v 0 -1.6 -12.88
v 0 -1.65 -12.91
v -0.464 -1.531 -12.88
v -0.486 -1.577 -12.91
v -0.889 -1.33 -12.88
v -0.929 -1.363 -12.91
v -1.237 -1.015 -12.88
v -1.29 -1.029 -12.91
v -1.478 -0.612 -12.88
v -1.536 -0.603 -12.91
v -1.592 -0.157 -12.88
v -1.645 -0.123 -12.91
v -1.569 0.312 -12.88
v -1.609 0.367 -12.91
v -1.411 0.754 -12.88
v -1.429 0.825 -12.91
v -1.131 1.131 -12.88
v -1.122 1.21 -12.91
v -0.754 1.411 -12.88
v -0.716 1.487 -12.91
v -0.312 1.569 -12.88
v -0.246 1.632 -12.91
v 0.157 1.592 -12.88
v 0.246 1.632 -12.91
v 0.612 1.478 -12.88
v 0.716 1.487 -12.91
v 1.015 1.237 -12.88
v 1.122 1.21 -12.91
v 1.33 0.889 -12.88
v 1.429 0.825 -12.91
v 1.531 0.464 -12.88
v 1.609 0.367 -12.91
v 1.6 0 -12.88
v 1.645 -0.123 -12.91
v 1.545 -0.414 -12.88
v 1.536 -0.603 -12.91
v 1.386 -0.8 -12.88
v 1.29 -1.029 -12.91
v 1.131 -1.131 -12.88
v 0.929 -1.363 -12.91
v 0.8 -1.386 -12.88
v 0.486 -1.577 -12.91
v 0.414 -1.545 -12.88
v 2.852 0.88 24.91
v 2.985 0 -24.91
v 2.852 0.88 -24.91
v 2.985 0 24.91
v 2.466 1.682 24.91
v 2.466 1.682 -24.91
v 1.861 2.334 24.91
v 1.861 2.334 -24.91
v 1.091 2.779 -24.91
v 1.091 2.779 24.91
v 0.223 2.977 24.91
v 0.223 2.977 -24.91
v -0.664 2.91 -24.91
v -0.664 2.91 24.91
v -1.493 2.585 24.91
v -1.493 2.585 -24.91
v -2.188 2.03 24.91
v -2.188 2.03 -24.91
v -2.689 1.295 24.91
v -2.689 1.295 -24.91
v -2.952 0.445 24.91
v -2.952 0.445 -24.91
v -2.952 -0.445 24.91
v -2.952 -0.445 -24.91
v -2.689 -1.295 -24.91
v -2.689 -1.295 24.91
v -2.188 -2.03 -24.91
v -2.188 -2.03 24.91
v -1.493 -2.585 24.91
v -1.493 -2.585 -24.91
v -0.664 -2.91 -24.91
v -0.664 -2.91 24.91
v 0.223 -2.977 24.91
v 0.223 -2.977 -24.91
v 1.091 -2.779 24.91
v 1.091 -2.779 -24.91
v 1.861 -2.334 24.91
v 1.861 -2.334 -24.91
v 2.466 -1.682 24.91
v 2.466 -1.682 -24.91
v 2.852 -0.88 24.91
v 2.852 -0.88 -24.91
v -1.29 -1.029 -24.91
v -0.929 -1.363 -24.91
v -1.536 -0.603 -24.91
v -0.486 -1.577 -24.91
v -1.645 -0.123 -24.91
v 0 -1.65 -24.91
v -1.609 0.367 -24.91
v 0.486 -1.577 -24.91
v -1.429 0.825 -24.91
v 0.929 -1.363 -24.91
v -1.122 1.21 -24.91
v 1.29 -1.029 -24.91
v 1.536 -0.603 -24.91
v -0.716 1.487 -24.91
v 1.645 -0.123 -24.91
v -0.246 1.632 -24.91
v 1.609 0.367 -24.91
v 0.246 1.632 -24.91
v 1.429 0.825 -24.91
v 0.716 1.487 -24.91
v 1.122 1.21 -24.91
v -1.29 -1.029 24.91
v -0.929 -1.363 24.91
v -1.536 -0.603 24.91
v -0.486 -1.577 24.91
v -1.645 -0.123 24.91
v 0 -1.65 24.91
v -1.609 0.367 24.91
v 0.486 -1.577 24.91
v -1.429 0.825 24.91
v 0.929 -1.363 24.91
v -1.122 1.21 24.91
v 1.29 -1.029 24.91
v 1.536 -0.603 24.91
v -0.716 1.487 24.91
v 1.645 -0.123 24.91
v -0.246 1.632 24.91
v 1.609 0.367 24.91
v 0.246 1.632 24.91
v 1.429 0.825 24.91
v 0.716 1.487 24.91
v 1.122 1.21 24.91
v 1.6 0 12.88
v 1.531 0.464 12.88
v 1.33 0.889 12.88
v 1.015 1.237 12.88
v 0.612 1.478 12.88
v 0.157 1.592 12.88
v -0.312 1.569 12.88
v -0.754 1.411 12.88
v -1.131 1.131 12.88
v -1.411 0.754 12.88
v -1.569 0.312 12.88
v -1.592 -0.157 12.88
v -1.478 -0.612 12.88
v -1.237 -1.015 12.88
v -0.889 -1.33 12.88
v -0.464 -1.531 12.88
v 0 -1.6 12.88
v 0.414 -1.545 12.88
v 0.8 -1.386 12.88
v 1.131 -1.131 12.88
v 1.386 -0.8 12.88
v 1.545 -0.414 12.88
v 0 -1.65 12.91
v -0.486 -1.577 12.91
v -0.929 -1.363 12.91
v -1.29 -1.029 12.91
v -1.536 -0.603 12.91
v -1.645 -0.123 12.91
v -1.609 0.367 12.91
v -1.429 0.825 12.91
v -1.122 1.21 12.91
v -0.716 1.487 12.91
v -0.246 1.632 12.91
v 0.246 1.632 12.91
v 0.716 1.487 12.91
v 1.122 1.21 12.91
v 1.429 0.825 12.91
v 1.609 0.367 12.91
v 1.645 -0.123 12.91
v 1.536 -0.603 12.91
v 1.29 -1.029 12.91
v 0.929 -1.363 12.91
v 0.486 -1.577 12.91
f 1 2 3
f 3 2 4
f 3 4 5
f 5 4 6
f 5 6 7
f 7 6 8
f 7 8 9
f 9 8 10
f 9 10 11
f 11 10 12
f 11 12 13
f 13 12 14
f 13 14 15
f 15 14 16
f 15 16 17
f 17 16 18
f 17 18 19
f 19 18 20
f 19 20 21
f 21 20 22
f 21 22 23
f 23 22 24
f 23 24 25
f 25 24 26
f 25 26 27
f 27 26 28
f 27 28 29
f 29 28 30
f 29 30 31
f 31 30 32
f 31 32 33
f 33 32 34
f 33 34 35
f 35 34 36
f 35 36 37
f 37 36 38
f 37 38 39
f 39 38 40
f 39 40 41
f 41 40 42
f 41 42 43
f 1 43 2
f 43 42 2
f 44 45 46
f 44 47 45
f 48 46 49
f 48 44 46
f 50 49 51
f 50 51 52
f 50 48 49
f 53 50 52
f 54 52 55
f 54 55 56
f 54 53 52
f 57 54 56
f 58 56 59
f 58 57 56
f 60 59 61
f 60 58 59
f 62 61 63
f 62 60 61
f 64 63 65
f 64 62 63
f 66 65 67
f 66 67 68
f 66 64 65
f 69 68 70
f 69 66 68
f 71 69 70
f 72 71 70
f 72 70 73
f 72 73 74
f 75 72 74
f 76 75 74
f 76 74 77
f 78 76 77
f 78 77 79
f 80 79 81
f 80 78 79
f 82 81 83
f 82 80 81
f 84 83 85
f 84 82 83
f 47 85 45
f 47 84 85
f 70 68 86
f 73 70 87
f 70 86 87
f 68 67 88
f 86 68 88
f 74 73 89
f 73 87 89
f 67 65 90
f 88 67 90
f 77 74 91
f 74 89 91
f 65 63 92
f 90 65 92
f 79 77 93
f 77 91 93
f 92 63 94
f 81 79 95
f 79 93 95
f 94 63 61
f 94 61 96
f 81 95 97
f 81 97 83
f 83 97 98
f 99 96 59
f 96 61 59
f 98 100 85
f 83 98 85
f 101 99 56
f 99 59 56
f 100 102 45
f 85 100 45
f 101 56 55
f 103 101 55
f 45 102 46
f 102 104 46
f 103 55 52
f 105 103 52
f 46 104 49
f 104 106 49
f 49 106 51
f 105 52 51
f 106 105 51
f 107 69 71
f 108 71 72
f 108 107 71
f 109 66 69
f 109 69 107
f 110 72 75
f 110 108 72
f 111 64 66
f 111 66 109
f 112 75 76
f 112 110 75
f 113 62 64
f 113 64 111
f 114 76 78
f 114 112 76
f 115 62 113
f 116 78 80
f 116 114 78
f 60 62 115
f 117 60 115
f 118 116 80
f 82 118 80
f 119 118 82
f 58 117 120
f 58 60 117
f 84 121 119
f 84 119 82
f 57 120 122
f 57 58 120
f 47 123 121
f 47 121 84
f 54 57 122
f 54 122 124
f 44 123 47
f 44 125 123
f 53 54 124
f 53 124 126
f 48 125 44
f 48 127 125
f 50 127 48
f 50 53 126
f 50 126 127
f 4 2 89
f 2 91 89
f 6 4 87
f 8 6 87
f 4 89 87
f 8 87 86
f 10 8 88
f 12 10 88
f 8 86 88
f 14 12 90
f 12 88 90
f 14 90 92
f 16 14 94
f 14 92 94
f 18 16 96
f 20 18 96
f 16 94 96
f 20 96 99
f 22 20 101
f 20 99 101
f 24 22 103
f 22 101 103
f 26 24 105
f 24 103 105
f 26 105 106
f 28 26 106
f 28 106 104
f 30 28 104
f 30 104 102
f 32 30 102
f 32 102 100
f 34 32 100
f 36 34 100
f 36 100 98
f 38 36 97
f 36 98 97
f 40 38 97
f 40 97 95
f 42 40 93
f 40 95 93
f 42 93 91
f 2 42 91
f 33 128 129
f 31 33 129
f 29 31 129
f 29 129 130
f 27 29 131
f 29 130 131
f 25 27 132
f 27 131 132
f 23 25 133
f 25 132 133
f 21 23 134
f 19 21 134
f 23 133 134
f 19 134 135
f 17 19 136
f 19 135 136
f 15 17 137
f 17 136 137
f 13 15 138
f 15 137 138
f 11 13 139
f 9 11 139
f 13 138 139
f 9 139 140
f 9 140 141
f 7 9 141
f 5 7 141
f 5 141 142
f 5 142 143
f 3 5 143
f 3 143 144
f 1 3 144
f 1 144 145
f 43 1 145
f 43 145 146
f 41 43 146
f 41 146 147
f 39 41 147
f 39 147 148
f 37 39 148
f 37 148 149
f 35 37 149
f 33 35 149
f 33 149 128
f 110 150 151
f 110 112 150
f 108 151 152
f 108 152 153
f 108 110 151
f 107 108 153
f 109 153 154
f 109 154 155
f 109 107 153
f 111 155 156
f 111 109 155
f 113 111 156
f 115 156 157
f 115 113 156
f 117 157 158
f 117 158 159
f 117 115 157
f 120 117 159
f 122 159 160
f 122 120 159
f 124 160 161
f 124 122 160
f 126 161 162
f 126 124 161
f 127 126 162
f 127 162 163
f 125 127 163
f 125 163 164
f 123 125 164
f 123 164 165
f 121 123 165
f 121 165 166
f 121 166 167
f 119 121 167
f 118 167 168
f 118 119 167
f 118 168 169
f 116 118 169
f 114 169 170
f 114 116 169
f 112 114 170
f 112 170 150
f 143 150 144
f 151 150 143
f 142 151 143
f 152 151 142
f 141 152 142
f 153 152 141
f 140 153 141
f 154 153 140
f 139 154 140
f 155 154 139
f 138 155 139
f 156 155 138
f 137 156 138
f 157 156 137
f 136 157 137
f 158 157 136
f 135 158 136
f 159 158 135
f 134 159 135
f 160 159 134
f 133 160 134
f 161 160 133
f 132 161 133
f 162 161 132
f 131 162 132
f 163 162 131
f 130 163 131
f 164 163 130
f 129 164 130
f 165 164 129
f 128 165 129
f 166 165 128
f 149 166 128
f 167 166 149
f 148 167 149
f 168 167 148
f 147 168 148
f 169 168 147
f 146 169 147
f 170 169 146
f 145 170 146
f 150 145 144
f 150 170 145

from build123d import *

# Parameters (mm, degrees)
SCHIZZO1_R                   = 2.985
ESTRUSIONE_ESTRUSIONE1_DEPTH = 24.91
SCHIZZO2_R                   = 1.6
TAGLIO_ESTRUSIONE1_DEPTH     = 50.998528478


with BuildPart() as part:
    # Schizzo1 → Estrusione-Estrusione1 (new, symmetric)
    with BuildSketch(Plane.XY):
        Circle(SCHIZZO1_R)
    extrude(amount=ESTRUSIONE_ESTRUSIONE1_DEPTH, both=True)

    # Schizzo2 → Taglio-Estrusione1 (cut, through all)
    with BuildSketch(Plane.XY.offset(24.91)):
        Circle(SCHIZZO2_R)
    extrude(amount=-TAGLIO_ESTRUSIONE1_DEPTH, mode=Mode.SUBTRACT)

    # Schizzo3 → Foro filettato M4x0.7-1 (revolve, cut)
    with BuildSketch(Plane(origin=(0, 0, 24.91), x_dir=(0, -1, 0), z_dir=(1, 0, 0))):
        Polygon((0, 0), (0, 12.991420021), (1.65, 12), (1.65, 0), align=None)
    foro_filettato_m4x0_7_1 = revolve(axis=Axis((0, 0, 31.26), (0, 0, -1)), mode=Mode.SUBTRACT)

    # Specchia1: Foro filettato M4x0.7-1 across plane
    add(foro_filettato_m4x0_7_1.mirror(Plane.XY), mode=Mode.SUBTRACT)


solid = part.part
